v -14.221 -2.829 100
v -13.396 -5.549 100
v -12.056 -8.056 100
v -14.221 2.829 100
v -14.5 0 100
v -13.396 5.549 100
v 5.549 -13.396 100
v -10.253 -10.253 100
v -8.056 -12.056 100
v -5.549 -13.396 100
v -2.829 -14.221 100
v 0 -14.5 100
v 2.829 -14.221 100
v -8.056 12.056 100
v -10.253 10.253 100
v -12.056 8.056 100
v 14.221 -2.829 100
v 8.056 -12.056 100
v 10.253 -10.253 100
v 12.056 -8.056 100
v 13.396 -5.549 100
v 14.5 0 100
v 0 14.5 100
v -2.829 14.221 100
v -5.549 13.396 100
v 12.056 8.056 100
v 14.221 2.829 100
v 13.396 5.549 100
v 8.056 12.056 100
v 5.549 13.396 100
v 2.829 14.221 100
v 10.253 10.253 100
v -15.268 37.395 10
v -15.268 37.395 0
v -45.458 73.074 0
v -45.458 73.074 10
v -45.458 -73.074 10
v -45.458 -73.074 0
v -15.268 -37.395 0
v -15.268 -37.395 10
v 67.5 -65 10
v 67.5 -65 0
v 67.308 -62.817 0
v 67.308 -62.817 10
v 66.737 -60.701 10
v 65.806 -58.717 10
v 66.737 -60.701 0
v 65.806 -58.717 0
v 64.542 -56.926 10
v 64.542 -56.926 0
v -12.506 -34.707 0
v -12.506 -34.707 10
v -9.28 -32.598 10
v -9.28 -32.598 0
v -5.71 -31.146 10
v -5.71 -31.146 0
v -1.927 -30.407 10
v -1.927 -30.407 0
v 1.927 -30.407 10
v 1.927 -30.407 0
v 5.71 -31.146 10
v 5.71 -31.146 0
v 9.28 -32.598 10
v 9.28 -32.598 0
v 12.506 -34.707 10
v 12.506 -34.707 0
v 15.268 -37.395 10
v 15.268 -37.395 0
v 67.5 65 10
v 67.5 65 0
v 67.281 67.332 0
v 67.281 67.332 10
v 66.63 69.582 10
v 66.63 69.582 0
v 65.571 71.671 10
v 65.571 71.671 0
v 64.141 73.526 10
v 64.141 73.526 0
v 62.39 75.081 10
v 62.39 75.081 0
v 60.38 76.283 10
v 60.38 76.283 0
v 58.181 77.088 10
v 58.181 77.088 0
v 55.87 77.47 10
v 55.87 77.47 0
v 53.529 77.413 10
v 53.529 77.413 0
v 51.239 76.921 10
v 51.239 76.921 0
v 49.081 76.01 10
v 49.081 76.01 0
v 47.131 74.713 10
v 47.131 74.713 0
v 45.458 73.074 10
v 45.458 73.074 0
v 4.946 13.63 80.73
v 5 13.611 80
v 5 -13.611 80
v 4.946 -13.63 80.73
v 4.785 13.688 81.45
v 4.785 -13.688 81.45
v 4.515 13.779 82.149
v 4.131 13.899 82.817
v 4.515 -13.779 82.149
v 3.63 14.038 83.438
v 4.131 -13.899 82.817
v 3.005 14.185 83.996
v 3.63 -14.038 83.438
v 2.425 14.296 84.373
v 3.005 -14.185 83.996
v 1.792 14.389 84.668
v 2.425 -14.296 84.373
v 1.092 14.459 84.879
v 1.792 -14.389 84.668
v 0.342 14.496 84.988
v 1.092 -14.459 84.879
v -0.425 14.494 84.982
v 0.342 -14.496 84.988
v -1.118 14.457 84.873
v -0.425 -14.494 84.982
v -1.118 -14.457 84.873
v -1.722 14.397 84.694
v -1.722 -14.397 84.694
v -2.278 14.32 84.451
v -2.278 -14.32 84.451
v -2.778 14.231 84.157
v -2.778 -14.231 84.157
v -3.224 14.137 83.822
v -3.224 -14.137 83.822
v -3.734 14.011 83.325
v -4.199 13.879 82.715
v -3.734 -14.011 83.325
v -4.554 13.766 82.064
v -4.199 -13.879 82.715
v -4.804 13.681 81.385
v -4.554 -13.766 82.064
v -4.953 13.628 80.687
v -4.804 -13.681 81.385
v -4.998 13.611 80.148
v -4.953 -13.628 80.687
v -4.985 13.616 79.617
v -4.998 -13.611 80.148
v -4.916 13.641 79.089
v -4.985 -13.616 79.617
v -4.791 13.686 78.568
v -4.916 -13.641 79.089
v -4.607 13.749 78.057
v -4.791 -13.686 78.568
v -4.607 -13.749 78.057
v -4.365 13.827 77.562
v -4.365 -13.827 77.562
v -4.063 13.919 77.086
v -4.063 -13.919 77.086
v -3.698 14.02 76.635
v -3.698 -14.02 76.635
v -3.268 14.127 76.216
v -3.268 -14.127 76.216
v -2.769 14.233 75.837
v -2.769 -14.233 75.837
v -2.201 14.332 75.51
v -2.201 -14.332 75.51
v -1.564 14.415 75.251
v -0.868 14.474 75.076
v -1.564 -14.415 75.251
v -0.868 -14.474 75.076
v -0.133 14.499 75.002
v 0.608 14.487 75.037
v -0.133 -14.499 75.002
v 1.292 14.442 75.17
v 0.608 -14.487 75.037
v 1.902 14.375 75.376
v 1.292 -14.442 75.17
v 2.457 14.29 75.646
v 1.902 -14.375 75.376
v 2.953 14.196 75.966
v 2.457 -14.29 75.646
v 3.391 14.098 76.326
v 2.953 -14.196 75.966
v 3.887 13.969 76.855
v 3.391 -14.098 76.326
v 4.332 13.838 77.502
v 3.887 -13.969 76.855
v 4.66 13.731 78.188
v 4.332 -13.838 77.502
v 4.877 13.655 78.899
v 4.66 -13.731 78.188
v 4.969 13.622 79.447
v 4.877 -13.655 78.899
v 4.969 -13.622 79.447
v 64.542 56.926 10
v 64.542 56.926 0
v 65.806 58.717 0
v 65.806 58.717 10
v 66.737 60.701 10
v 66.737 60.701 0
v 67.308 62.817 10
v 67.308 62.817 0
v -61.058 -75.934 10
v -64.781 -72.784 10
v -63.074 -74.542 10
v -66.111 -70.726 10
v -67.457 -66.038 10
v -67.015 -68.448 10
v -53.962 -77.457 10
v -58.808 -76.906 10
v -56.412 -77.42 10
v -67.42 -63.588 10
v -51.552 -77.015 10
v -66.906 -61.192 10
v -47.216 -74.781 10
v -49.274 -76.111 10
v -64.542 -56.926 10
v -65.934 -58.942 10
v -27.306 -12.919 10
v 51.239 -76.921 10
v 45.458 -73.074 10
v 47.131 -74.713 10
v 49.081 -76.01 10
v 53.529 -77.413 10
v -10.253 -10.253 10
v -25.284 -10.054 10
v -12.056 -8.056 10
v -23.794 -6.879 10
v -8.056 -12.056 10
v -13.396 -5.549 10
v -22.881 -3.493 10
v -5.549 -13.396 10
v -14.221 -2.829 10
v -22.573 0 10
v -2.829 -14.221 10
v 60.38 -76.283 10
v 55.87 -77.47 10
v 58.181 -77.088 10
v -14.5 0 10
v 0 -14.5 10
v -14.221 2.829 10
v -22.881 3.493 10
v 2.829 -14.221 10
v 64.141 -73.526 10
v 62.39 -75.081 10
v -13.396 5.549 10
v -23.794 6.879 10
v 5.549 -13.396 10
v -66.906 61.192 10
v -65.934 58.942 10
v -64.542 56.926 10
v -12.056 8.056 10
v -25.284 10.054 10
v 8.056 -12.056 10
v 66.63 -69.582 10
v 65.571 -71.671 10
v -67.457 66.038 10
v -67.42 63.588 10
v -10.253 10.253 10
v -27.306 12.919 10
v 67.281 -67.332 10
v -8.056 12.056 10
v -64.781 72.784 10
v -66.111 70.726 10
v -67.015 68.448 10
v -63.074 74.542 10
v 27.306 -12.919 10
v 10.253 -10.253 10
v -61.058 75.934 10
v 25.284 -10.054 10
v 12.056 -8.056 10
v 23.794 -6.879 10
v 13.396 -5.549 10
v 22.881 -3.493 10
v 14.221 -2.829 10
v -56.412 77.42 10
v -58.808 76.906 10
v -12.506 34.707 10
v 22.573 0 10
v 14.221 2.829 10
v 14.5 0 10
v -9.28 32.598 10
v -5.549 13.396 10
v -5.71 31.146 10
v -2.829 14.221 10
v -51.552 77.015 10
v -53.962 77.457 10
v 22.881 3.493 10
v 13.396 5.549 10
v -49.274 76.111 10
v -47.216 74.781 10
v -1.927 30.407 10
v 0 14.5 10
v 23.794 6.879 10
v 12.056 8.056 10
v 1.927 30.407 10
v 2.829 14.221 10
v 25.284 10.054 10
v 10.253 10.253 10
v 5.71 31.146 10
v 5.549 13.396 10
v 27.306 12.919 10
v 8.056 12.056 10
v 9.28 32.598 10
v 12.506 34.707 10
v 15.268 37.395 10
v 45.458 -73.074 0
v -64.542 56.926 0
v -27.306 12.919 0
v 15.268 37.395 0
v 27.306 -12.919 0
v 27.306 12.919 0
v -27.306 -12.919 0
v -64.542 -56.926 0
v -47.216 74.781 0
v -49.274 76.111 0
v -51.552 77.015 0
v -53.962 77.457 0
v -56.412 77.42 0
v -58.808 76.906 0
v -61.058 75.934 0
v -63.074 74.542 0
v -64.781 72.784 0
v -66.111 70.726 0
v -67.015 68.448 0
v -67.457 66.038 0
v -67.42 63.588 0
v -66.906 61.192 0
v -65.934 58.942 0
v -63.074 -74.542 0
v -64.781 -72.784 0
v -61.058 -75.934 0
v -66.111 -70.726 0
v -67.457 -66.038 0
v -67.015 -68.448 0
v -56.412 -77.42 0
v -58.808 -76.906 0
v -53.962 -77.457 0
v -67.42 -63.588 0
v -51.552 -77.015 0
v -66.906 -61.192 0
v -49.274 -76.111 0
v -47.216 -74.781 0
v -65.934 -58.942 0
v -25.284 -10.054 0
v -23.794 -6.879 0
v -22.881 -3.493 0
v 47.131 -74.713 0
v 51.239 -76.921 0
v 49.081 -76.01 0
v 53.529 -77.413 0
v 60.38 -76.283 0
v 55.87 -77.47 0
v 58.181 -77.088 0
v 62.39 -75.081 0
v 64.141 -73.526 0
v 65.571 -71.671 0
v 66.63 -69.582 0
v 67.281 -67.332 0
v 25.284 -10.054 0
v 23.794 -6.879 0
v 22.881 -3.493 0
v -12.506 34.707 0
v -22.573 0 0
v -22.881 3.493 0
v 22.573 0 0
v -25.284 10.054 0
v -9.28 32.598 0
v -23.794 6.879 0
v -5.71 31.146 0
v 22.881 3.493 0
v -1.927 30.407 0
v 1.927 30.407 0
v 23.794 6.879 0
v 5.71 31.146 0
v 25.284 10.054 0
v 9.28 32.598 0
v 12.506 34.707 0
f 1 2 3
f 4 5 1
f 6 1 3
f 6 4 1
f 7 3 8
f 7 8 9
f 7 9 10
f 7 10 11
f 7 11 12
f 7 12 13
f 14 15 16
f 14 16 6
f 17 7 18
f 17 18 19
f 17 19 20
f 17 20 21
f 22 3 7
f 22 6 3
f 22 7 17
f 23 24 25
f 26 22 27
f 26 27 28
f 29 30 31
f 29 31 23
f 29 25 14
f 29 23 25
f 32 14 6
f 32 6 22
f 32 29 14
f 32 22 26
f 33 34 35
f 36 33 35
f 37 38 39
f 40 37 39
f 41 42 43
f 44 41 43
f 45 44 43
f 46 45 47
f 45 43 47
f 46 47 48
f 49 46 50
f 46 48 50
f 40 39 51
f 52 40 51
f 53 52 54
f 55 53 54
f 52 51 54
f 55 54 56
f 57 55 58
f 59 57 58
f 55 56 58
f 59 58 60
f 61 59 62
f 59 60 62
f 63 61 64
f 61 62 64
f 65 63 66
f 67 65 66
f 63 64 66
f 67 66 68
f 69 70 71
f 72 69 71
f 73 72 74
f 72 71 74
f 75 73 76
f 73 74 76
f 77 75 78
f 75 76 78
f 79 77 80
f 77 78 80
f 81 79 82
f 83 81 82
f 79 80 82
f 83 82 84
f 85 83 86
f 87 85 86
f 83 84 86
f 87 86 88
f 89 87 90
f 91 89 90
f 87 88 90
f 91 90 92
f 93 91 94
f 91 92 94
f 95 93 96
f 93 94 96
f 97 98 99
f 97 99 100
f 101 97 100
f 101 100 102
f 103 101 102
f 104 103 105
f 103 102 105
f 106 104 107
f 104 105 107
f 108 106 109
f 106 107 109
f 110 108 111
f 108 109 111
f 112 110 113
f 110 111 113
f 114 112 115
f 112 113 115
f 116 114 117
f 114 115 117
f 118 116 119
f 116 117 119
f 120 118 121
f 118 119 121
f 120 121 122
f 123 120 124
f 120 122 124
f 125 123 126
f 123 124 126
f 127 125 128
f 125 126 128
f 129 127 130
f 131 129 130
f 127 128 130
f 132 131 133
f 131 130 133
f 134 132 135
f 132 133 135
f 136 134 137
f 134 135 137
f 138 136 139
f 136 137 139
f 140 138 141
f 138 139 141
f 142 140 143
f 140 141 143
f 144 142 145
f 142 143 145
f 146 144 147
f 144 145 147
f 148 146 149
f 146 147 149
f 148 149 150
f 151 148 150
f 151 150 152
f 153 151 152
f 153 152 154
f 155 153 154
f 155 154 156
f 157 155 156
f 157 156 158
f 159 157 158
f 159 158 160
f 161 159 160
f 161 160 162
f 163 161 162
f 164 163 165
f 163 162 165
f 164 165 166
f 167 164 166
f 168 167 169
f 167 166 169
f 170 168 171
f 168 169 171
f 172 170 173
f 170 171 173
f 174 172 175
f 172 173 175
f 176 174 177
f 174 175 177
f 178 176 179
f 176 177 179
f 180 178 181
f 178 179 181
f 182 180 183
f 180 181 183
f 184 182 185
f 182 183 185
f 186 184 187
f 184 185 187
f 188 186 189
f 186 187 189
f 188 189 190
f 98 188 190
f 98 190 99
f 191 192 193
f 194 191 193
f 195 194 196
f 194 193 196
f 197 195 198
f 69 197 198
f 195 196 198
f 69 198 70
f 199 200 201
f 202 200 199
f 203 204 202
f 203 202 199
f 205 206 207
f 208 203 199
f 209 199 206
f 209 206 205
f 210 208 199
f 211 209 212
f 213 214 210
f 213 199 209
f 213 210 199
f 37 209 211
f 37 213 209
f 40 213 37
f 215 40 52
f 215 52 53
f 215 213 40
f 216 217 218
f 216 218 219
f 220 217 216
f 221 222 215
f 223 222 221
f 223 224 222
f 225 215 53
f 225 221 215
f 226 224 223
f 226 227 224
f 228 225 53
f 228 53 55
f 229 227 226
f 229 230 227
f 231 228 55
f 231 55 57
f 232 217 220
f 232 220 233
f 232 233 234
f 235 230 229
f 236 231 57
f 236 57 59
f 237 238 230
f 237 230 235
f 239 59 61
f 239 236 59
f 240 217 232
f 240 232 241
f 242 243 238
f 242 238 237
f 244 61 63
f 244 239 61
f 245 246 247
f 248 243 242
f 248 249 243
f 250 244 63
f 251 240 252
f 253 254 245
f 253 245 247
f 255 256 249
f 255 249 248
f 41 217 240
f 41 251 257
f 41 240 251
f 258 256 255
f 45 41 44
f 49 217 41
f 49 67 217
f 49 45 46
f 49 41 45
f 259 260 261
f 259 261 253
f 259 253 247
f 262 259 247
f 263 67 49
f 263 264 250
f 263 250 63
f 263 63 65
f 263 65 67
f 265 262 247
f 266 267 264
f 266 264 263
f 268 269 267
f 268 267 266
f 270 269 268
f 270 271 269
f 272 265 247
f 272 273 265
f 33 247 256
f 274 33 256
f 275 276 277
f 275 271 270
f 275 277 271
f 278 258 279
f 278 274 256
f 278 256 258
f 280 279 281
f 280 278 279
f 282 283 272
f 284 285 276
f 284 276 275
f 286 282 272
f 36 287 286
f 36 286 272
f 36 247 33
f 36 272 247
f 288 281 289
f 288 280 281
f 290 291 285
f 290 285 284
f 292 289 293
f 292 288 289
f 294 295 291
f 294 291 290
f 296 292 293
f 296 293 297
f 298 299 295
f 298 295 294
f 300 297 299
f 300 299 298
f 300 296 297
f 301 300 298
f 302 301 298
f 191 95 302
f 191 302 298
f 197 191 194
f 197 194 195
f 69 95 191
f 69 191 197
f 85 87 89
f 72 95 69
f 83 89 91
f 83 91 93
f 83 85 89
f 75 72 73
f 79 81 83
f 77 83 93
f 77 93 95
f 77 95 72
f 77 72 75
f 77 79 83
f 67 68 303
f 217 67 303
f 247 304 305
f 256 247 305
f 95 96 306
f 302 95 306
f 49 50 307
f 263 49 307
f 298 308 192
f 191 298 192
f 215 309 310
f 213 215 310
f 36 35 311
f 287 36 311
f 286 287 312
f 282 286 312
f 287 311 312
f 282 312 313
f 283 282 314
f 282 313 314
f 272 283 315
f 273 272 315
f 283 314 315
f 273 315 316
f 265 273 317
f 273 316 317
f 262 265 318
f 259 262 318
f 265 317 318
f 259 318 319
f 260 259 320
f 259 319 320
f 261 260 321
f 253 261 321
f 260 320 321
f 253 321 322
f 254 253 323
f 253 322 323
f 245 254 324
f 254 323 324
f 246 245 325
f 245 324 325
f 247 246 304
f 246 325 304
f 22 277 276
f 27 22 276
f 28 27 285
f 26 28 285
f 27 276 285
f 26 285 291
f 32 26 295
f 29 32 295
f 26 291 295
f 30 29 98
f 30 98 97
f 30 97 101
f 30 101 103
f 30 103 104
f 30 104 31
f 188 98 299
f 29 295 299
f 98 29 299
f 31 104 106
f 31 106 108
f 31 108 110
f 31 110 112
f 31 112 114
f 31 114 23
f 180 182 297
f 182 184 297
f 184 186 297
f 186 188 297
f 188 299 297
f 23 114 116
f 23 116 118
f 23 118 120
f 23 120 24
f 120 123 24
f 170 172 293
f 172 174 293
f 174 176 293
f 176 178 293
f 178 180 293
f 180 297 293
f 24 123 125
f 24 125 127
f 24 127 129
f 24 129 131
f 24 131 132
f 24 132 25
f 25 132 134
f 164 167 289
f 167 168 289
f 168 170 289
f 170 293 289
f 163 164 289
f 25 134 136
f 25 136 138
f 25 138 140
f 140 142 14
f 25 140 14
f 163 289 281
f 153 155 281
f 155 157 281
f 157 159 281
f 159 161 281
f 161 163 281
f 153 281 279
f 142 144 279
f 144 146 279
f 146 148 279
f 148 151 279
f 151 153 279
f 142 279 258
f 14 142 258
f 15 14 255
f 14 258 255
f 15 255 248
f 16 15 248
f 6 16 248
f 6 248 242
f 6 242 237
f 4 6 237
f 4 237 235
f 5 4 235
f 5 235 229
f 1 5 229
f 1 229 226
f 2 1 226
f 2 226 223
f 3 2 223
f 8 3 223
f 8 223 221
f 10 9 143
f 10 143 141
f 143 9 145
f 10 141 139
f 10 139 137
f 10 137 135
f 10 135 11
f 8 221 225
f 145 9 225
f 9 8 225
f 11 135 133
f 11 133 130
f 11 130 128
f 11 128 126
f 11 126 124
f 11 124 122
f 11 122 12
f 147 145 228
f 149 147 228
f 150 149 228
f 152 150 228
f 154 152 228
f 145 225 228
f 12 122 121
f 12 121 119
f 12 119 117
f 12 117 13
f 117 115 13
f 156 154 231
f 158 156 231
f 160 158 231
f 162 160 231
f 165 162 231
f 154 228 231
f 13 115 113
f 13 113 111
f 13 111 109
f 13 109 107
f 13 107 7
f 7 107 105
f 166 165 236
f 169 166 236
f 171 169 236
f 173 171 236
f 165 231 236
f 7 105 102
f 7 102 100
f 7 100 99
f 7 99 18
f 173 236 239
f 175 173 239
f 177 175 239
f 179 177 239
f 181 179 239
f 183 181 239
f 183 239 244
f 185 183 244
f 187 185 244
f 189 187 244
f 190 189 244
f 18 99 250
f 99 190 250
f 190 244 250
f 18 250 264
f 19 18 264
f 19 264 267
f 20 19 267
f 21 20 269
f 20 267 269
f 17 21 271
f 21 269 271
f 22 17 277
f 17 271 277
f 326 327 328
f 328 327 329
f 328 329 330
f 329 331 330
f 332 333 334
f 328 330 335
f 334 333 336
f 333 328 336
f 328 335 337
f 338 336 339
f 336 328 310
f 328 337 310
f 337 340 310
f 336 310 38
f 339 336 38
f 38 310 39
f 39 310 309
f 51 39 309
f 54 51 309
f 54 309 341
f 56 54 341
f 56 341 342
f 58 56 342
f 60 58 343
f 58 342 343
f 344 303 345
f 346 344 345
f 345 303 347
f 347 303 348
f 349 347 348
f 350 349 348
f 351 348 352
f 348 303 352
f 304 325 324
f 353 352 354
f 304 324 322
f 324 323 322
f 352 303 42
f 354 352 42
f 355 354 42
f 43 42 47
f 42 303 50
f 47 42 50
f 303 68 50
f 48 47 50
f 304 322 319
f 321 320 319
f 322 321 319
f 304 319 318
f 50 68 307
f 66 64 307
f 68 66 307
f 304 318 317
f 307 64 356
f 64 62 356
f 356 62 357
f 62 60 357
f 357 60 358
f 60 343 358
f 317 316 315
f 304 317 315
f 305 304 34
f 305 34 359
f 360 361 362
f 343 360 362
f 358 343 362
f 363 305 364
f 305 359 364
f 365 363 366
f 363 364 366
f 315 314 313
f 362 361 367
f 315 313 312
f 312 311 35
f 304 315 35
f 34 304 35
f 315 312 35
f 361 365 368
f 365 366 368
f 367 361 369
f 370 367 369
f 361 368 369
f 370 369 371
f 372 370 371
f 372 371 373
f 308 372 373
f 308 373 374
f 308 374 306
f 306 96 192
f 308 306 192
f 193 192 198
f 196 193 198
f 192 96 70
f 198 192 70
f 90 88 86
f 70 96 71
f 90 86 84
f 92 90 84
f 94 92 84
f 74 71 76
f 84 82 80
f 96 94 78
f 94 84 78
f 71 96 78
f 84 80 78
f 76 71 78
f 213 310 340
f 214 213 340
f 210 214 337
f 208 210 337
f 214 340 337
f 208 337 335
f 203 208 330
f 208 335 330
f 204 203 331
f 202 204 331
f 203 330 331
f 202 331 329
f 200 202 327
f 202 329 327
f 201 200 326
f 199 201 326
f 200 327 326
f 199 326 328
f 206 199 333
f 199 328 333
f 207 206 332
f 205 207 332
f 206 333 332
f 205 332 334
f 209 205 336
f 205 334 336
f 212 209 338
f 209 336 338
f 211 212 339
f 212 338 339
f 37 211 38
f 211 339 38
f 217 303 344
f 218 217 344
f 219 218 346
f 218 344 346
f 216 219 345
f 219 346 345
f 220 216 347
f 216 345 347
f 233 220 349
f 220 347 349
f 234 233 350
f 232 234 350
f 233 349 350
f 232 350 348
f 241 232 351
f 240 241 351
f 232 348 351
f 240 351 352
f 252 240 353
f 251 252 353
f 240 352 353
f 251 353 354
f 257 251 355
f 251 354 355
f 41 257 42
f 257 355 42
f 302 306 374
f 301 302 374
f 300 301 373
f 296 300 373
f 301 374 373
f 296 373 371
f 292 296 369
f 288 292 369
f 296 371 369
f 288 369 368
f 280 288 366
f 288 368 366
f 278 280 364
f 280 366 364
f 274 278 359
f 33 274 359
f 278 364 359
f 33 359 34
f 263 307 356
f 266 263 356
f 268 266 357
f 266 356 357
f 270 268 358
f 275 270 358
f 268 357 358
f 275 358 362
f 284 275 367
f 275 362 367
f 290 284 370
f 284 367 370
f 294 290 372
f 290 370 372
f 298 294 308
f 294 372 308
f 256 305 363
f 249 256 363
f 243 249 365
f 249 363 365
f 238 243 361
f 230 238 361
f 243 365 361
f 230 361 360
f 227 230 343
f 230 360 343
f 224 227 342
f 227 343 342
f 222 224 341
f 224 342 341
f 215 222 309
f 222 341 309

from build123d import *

# Parameters (mm, degrees)
F1_DEPTH = 10
F3_R     = 14.5
F4_DEPTH = 90
F2_R     = 5
F5_DEPTH = 25


# Not quite as in the source:
# - a feature names something its author has since deleted; it is built from what else it names


with BuildPart() as f1:
    # F0 (on Top) → F1 (new body)
    with BuildSketch(Plane.XY):
        with BuildLine():
            Line((-45.4576714329, 73.0742780183), (-55, 65))
            Line((-55, 65), (-46.9257219817, 55.4576714329))
            ThreePointArc((-46.9257219817, 55.4576714329), (-43.6602805319, 59.7406500035), (-42.5, 65))
            ThreePointArc((-42.5, 65), (-43.2626854202, 69.2994704855), (-45.4576714329, 73.0742780183))
        make_face()
        with BuildLine():
            Line((-46.9257219817, 55.4576714329), (-55, 65))
            Line((-55, 65), (-64.5423285671, 56.9257219817))
            ThreePointArc((-64.5423285671, 56.9257219817), (-56.0380684982, 52.5431780219), (-46.9257219817, 55.4576714329))
        make_face()
        with BuildLine():
            Line((-64.5423285671, 56.9257219817), (-55, 65))
            Line((-55, 65), (-45.4576714329, 73.0742780183))
            ThreePointArc((-45.4576714329, 73.0742780183), (-63.0742780183, 74.5423285671), (-64.5423285671, 56.9257219817))
        make_face()
        with BuildLine():
            ThreePointArc((-42.5, 65), (-43.6602805319, 59.7406500035), (-46.9257219817, 55.4576714329))
            Line((-46.9257219817, 55.4576714329), (-9.3661625013, 11.0691011379))
            ThreePointArc((-9.3661625013, 11.0691011379), (0, 14.5), (9.3661625013, 11.0691011379))
            Line((9.3661625013, 11.0691011379), (46.9257219817, 55.4576714329))
            ThreePointArc((46.9257219817, 55.4576714329), (42.5431780219, 63.9619315018), (45.4576714329, 73.0742780183))
            Line((45.4576714329, 73.0742780183), (15.2677257074, 37.3952512518))
            ThreePointArc((15.2677257074, 37.3952512518), (0, 30.3140960811), (-15.2677257074, 37.3952512518))
            Line((-15.2677257074, 37.3952512518), (-45.4576714329, 73.0742780183))
            ThreePointArc((-45.4576714329, 73.0742780183), (-43.2626854202, 69.2994704855), (-42.5, 65))
        make_face()
        with BuildLine():
            Line((-9.3661625013, 11.0691011379), (-46.9257219817, 55.4576714329))
            ThreePointArc((-46.9257219817, 55.4576714329), (-56.0380684982, 52.5431780219), (-64.5423285671, 56.9257219817))
            Line((-64.5423285671, 56.9257219817), (-27.3057402074, 12.9188448293))
            ThreePointArc((-27.3057402074, 12.9188448293), (-22.5734659148, 0), (-27.3057402074, -12.9188448293))
            Line((-27.3057402074, -12.9188448293), (-64.5423285671, -56.9257219817))
            ThreePointArc((-64.5423285671, -56.9257219817), (-56.0380684982, -52.5431780219), (-46.9257219817, -55.4576714329))
            Line((-46.9257219817, -55.4576714329), (-9.3661625013, -11.0691011379))
            ThreePointArc((-9.3661625013, -11.0691011379), (-14.5, 0), (-9.3661625013, 11.0691011379))
        make_face()
        with BuildLine():
            ThreePointArc((9.3661625013, 11.0691011379), (0, 14.5), (-9.3661625013, 11.0691011379))
            Line((-9.3661625013, 11.0691011379), (0, 0))
            Line((0, 0), (9.3661625013, 11.0691011379))
        make_face()
        with BuildLine():
            Line((0, 0), (-9.3661625013, 11.0691011379))
            ThreePointArc((-9.3661625013, 11.0691011379), (-14.5, 0), (-9.3661625013, -11.0691011379))
            Line((-9.3661625013, -11.0691011379), (0, 0))
        make_face()
        with BuildLine():
            Line((9.3661625013, 11.0691011379), (0, 0))
            Line((0, 0), (9.3661625013, -11.0691011379))
            ThreePointArc((9.3661625013, -11.0691011379), (13.154074583, -6.1008459959), (14.5, 0))
            ThreePointArc((14.5, 0), (13.154074583, 6.1008459959), (9.3661625013, 11.0691011379))
        make_face()
        with BuildLine():
            Line((9.3661625013, -11.0691011379), (0, 0))
            Line((0, 0), (-9.3661625013, -11.0691011379))
            ThreePointArc((-9.3661625013, -11.0691011379), (0, -14.5), (9.3661625013, -11.0691011379))
        make_face()
        with BuildLine():
            Line((46.9257219817, 55.4576714329), (9.3661625013, 11.0691011379))
            ThreePointArc((9.3661625013, 11.0691011379), (13.154074583, 6.1008459959), (14.5, 0))
            ThreePointArc((14.5, 0), (13.154074583, -6.1008459959), (9.3661625013, -11.0691011379))
            Line((9.3661625013, -11.0691011379), (46.9257219817, -55.4576714329))
            ThreePointArc((46.9257219817, -55.4576714329), (56.0380684982, -52.5431780219), (64.5423285671, -56.9257219817))
            Line((64.5423285671, -56.9257219817), (27.3057402074, -12.9188448293))
            ThreePointArc((27.3057402074, -12.9188448293), (22.5734659148, 0), (27.3057402074, 12.9188448293))
            Line((27.3057402074, 12.9188448293), (64.5423285671, 56.9257219817))
            ThreePointArc((64.5423285671, 56.9257219817), (56.0380684982, 52.5431780219), (46.9257219817, 55.4576714329))
        make_face()
        with BuildLine():
            ThreePointArc((9.3661625013, -11.0691011379), (0, -14.5), (-9.3661625013, -11.0691011379))
            Line((-9.3661625013, -11.0691011379), (-46.9257219817, -55.4576714329))
            ThreePointArc((-46.9257219817, -55.4576714329), (-43.6602805319, -59.7406500035), (-42.5, -65))
            ThreePointArc((-42.5, -65), (-43.2626854202, -69.2994704855), (-45.4576714329, -73.0742780183))
            Line((-45.4576714329, -73.0742780183), (-15.2677257074, -37.3952512518))
            ThreePointArc((-15.2677257074, -37.3952512518), (0, -30.3140960811), (15.2677257074, -37.3952512518))
            Line((15.2677257074, -37.3952512518), (45.4576714329, -73.0742780183))
            ThreePointArc((45.4576714329, -73.0742780183), (42.5431780219, -63.9619315018), (46.9257219817, -55.4576714329))
            Line((46.9257219817, -55.4576714329), (9.3661625013, -11.0691011379))
        make_face()
        with BuildLine():
            ThreePointArc((45.4576714329, 73.0742780183), (42.5431780219, 63.9619315018), (46.9257219817, 55.4576714329))
            Line((46.9257219817, 55.4576714329), (55, 65))
            Line((55, 65), (45.4576714329, 73.0742780183))
        make_face()
        with BuildLine():
            Line((55, 65), (46.9257219817, 55.4576714329))
            ThreePointArc((46.9257219817, 55.4576714329), (56.0380684982, 52.5431780219), (64.5423285671, 56.9257219817))
            Line((64.5423285671, 56.9257219817), (55, 65))
        make_face()
        with BuildLine():
            ThreePointArc((-42.5, -65), (-43.6602805319, -59.7406500035), (-46.9257219817, -55.4576714329))
            Line((-46.9257219817, -55.4576714329), (-55, -65))
            Line((-55, -65), (-45.4576714329, -73.0742780183))
            ThreePointArc((-45.4576714329, -73.0742780183), (-43.2626854202, -69.2994704855), (-42.5, -65))
        make_face()
        with BuildLine():
            Line((-55, -65), (-46.9257219817, -55.4576714329))
            ThreePointArc((-46.9257219817, -55.4576714329), (-56.0380684982, -52.5431780219), (-64.5423285671, -56.9257219817))
            Line((-64.5423285671, -56.9257219817), (-55, -65))
        make_face()
        with BuildLine():
            Line((-55, -65), (-64.5423285671, -56.9257219817))
            ThreePointArc((-64.5423285671, -56.9257219817), (-63.0742780183, -74.5423285671), (-45.4576714329, -73.0742780183))
            Line((-45.4576714329, -73.0742780183), (-55, -65))
        make_face()
        with BuildLine():
            ThreePointArc((67.5, 65), (59.2994704855, 76.7373145798), (45.4576714329, 73.0742780183))
            Line((45.4576714329, 73.0742780183), (55, 65))
            Line((55, 65), (64.5423285671, 56.9257219817))
            ThreePointArc((64.5423285671, 56.9257219817), (66.7373145798, 60.7005295145), (67.5, 65))
        make_face()
        with BuildLine():
            ThreePointArc((64.5423285671, -56.9257219817), (56.0380684982, -52.5431780219), (46.9257219817, -55.4576714329))
            Line((46.9257219817, -55.4576714329), (55, -65))
            Line((55, -65), (64.5423285671, -56.9257219817))
        make_face()
        with BuildLine():
            Line((55, -65), (46.9257219817, -55.4576714329))
            ThreePointArc((46.9257219817, -55.4576714329), (42.5431780219, -63.9619315018), (45.4576714329, -73.0742780183))
            Line((45.4576714329, -73.0742780183), (55, -65))
        make_face()
        with BuildLine():
            Line((64.5423285671, -56.9257219817), (55, -65))
            Line((55, -65), (45.4576714329, -73.0742780183))
            ThreePointArc((45.4576714329, -73.0742780183), (59.2994704855, -76.7373145798), (67.5, -65))
            ThreePointArc((67.5, -65), (66.7373145798, -60.7005295145), (64.5423285671, -56.9257219817))
        make_face()
    extrude(amount=F1_DEPTH)

    # F3 (on face) → F4 (join)
    with BuildSketch(Plane.XY.offset(10)):
        Circle(F3_R)
    extrude(amount=F4_DEPTH)

    # F2 (on Front) → F5 (cut, symmetric)
    with BuildSketch(Plane.XZ):
        with Locations((0, 80)):
            Circle(F2_R)
    extrude(amount=F5_DEPTH, both=True, mode=Mode.SUBTRACT)


solid = f1.part
